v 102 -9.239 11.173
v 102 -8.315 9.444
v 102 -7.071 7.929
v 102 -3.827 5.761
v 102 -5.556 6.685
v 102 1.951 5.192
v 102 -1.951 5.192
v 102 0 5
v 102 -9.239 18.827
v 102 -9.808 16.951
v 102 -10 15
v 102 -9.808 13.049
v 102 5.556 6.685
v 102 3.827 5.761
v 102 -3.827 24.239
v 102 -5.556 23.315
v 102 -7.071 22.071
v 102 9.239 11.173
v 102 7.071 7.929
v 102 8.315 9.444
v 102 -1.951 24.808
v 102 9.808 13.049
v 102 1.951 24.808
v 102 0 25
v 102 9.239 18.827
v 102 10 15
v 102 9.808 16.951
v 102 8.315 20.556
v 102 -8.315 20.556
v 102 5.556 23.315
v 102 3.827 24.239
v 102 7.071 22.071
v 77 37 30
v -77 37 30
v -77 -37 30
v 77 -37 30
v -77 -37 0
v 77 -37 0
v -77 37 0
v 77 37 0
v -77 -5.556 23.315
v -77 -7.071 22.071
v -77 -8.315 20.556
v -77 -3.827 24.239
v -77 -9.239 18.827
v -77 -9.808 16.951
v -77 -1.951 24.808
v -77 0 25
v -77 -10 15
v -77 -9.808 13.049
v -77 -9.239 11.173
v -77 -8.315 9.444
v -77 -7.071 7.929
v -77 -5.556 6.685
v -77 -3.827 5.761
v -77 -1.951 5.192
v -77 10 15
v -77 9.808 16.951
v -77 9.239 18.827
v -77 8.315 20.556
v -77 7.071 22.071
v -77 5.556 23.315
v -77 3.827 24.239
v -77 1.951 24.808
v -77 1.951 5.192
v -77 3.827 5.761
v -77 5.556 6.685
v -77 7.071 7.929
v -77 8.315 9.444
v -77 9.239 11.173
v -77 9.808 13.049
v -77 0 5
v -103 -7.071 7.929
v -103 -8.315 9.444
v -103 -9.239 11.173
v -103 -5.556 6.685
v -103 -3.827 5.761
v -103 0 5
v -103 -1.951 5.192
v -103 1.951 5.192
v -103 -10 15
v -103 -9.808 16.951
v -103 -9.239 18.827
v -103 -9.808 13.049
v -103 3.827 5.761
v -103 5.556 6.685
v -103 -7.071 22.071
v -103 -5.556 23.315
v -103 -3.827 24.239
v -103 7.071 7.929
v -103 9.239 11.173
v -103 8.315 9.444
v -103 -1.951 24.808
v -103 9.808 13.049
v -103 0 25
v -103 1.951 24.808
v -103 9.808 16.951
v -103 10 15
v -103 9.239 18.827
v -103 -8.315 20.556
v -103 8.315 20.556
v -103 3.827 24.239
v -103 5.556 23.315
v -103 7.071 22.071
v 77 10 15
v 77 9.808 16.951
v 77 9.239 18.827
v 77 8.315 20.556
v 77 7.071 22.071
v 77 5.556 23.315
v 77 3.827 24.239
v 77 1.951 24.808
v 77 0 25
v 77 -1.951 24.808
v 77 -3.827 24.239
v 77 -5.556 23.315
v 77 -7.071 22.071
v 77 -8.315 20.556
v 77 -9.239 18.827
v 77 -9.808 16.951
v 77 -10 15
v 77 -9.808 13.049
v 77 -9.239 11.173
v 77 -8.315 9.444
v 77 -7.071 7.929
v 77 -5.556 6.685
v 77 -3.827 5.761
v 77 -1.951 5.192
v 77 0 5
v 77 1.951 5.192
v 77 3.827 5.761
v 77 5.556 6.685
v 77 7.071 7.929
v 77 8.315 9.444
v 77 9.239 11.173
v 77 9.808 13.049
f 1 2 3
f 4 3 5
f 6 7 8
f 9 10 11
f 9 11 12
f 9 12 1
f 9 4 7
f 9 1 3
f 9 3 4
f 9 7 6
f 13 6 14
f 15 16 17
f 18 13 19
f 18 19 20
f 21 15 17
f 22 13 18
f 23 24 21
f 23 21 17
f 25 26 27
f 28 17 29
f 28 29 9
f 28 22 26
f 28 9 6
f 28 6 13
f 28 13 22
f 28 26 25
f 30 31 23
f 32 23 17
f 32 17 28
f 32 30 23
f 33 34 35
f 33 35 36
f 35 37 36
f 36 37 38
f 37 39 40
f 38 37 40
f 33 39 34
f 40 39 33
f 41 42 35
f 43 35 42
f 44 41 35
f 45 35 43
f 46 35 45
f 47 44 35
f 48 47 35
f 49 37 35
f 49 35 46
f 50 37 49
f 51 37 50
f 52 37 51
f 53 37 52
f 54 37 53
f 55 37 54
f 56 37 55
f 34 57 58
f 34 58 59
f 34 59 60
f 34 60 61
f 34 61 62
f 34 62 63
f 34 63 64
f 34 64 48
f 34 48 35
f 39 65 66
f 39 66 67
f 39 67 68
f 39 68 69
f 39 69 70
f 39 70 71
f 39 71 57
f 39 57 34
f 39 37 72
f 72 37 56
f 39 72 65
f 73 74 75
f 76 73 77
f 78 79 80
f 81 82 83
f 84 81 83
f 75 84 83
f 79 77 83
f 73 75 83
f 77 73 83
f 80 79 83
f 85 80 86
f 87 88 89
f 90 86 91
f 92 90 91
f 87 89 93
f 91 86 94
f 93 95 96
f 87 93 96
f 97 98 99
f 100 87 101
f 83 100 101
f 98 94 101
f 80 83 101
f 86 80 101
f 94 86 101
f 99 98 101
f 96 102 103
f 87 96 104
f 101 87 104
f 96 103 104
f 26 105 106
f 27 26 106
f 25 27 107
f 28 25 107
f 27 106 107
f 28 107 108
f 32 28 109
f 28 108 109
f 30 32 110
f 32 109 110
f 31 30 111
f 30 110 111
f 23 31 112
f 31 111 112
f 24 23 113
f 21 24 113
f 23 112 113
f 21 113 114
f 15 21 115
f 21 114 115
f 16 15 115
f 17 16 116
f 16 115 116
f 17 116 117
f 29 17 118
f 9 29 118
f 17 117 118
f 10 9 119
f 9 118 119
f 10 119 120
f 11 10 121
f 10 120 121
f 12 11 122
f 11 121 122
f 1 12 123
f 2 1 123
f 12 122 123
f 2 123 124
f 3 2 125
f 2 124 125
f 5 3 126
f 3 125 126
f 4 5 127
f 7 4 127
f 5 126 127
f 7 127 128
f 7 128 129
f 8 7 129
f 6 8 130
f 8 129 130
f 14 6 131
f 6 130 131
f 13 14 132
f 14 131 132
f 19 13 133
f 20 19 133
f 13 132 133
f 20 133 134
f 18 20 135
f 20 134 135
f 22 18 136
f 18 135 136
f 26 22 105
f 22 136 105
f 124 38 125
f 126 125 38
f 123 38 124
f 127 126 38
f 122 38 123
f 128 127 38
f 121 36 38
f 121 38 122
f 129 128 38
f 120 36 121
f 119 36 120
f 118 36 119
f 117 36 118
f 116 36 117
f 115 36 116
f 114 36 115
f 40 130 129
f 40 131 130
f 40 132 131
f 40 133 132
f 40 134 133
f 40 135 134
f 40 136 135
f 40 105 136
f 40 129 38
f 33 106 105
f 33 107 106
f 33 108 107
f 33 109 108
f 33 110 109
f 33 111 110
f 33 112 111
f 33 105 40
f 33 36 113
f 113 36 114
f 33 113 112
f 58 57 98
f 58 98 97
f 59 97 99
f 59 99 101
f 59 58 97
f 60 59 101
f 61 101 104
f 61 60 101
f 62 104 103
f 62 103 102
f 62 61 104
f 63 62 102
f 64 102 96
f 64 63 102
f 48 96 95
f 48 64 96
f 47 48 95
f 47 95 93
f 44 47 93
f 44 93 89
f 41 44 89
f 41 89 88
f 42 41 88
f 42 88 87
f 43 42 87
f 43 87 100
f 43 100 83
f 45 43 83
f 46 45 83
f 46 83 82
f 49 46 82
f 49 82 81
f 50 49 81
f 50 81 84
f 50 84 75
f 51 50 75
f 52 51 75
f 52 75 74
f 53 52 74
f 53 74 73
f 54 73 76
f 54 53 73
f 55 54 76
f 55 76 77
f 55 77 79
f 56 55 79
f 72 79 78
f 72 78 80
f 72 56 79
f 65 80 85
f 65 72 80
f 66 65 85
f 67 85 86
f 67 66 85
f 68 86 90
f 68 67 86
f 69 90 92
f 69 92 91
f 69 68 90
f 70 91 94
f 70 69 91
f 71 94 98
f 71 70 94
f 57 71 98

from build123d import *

# Parameters (mm, degrees)
F0_W          = 154
F0_H          = 74
F1_DEPTH      = 30
F2_R          = 10
F3_DEPTH      = 180
F3_DEPTH_BACK = 25


with BuildPart() as f1:
    # F0 (on Top) → F1 (new body)
    with BuildSketch(Plane.XY):
        Rectangle(F0_W, F0_H)
    extrude(amount=F1_DEPTH)

    # F2 (on face) → F3 (join, two sides)
    with BuildSketch(Plane.YZ.offset(77)) as f3_sk:
        with Locations((0, 15)):
            Circle(F2_R)
    extrude(amount=-F3_DEPTH)
    extrude(f3_sk.sketch, amount=F3_DEPTH_BACK)


solid = f1.part
